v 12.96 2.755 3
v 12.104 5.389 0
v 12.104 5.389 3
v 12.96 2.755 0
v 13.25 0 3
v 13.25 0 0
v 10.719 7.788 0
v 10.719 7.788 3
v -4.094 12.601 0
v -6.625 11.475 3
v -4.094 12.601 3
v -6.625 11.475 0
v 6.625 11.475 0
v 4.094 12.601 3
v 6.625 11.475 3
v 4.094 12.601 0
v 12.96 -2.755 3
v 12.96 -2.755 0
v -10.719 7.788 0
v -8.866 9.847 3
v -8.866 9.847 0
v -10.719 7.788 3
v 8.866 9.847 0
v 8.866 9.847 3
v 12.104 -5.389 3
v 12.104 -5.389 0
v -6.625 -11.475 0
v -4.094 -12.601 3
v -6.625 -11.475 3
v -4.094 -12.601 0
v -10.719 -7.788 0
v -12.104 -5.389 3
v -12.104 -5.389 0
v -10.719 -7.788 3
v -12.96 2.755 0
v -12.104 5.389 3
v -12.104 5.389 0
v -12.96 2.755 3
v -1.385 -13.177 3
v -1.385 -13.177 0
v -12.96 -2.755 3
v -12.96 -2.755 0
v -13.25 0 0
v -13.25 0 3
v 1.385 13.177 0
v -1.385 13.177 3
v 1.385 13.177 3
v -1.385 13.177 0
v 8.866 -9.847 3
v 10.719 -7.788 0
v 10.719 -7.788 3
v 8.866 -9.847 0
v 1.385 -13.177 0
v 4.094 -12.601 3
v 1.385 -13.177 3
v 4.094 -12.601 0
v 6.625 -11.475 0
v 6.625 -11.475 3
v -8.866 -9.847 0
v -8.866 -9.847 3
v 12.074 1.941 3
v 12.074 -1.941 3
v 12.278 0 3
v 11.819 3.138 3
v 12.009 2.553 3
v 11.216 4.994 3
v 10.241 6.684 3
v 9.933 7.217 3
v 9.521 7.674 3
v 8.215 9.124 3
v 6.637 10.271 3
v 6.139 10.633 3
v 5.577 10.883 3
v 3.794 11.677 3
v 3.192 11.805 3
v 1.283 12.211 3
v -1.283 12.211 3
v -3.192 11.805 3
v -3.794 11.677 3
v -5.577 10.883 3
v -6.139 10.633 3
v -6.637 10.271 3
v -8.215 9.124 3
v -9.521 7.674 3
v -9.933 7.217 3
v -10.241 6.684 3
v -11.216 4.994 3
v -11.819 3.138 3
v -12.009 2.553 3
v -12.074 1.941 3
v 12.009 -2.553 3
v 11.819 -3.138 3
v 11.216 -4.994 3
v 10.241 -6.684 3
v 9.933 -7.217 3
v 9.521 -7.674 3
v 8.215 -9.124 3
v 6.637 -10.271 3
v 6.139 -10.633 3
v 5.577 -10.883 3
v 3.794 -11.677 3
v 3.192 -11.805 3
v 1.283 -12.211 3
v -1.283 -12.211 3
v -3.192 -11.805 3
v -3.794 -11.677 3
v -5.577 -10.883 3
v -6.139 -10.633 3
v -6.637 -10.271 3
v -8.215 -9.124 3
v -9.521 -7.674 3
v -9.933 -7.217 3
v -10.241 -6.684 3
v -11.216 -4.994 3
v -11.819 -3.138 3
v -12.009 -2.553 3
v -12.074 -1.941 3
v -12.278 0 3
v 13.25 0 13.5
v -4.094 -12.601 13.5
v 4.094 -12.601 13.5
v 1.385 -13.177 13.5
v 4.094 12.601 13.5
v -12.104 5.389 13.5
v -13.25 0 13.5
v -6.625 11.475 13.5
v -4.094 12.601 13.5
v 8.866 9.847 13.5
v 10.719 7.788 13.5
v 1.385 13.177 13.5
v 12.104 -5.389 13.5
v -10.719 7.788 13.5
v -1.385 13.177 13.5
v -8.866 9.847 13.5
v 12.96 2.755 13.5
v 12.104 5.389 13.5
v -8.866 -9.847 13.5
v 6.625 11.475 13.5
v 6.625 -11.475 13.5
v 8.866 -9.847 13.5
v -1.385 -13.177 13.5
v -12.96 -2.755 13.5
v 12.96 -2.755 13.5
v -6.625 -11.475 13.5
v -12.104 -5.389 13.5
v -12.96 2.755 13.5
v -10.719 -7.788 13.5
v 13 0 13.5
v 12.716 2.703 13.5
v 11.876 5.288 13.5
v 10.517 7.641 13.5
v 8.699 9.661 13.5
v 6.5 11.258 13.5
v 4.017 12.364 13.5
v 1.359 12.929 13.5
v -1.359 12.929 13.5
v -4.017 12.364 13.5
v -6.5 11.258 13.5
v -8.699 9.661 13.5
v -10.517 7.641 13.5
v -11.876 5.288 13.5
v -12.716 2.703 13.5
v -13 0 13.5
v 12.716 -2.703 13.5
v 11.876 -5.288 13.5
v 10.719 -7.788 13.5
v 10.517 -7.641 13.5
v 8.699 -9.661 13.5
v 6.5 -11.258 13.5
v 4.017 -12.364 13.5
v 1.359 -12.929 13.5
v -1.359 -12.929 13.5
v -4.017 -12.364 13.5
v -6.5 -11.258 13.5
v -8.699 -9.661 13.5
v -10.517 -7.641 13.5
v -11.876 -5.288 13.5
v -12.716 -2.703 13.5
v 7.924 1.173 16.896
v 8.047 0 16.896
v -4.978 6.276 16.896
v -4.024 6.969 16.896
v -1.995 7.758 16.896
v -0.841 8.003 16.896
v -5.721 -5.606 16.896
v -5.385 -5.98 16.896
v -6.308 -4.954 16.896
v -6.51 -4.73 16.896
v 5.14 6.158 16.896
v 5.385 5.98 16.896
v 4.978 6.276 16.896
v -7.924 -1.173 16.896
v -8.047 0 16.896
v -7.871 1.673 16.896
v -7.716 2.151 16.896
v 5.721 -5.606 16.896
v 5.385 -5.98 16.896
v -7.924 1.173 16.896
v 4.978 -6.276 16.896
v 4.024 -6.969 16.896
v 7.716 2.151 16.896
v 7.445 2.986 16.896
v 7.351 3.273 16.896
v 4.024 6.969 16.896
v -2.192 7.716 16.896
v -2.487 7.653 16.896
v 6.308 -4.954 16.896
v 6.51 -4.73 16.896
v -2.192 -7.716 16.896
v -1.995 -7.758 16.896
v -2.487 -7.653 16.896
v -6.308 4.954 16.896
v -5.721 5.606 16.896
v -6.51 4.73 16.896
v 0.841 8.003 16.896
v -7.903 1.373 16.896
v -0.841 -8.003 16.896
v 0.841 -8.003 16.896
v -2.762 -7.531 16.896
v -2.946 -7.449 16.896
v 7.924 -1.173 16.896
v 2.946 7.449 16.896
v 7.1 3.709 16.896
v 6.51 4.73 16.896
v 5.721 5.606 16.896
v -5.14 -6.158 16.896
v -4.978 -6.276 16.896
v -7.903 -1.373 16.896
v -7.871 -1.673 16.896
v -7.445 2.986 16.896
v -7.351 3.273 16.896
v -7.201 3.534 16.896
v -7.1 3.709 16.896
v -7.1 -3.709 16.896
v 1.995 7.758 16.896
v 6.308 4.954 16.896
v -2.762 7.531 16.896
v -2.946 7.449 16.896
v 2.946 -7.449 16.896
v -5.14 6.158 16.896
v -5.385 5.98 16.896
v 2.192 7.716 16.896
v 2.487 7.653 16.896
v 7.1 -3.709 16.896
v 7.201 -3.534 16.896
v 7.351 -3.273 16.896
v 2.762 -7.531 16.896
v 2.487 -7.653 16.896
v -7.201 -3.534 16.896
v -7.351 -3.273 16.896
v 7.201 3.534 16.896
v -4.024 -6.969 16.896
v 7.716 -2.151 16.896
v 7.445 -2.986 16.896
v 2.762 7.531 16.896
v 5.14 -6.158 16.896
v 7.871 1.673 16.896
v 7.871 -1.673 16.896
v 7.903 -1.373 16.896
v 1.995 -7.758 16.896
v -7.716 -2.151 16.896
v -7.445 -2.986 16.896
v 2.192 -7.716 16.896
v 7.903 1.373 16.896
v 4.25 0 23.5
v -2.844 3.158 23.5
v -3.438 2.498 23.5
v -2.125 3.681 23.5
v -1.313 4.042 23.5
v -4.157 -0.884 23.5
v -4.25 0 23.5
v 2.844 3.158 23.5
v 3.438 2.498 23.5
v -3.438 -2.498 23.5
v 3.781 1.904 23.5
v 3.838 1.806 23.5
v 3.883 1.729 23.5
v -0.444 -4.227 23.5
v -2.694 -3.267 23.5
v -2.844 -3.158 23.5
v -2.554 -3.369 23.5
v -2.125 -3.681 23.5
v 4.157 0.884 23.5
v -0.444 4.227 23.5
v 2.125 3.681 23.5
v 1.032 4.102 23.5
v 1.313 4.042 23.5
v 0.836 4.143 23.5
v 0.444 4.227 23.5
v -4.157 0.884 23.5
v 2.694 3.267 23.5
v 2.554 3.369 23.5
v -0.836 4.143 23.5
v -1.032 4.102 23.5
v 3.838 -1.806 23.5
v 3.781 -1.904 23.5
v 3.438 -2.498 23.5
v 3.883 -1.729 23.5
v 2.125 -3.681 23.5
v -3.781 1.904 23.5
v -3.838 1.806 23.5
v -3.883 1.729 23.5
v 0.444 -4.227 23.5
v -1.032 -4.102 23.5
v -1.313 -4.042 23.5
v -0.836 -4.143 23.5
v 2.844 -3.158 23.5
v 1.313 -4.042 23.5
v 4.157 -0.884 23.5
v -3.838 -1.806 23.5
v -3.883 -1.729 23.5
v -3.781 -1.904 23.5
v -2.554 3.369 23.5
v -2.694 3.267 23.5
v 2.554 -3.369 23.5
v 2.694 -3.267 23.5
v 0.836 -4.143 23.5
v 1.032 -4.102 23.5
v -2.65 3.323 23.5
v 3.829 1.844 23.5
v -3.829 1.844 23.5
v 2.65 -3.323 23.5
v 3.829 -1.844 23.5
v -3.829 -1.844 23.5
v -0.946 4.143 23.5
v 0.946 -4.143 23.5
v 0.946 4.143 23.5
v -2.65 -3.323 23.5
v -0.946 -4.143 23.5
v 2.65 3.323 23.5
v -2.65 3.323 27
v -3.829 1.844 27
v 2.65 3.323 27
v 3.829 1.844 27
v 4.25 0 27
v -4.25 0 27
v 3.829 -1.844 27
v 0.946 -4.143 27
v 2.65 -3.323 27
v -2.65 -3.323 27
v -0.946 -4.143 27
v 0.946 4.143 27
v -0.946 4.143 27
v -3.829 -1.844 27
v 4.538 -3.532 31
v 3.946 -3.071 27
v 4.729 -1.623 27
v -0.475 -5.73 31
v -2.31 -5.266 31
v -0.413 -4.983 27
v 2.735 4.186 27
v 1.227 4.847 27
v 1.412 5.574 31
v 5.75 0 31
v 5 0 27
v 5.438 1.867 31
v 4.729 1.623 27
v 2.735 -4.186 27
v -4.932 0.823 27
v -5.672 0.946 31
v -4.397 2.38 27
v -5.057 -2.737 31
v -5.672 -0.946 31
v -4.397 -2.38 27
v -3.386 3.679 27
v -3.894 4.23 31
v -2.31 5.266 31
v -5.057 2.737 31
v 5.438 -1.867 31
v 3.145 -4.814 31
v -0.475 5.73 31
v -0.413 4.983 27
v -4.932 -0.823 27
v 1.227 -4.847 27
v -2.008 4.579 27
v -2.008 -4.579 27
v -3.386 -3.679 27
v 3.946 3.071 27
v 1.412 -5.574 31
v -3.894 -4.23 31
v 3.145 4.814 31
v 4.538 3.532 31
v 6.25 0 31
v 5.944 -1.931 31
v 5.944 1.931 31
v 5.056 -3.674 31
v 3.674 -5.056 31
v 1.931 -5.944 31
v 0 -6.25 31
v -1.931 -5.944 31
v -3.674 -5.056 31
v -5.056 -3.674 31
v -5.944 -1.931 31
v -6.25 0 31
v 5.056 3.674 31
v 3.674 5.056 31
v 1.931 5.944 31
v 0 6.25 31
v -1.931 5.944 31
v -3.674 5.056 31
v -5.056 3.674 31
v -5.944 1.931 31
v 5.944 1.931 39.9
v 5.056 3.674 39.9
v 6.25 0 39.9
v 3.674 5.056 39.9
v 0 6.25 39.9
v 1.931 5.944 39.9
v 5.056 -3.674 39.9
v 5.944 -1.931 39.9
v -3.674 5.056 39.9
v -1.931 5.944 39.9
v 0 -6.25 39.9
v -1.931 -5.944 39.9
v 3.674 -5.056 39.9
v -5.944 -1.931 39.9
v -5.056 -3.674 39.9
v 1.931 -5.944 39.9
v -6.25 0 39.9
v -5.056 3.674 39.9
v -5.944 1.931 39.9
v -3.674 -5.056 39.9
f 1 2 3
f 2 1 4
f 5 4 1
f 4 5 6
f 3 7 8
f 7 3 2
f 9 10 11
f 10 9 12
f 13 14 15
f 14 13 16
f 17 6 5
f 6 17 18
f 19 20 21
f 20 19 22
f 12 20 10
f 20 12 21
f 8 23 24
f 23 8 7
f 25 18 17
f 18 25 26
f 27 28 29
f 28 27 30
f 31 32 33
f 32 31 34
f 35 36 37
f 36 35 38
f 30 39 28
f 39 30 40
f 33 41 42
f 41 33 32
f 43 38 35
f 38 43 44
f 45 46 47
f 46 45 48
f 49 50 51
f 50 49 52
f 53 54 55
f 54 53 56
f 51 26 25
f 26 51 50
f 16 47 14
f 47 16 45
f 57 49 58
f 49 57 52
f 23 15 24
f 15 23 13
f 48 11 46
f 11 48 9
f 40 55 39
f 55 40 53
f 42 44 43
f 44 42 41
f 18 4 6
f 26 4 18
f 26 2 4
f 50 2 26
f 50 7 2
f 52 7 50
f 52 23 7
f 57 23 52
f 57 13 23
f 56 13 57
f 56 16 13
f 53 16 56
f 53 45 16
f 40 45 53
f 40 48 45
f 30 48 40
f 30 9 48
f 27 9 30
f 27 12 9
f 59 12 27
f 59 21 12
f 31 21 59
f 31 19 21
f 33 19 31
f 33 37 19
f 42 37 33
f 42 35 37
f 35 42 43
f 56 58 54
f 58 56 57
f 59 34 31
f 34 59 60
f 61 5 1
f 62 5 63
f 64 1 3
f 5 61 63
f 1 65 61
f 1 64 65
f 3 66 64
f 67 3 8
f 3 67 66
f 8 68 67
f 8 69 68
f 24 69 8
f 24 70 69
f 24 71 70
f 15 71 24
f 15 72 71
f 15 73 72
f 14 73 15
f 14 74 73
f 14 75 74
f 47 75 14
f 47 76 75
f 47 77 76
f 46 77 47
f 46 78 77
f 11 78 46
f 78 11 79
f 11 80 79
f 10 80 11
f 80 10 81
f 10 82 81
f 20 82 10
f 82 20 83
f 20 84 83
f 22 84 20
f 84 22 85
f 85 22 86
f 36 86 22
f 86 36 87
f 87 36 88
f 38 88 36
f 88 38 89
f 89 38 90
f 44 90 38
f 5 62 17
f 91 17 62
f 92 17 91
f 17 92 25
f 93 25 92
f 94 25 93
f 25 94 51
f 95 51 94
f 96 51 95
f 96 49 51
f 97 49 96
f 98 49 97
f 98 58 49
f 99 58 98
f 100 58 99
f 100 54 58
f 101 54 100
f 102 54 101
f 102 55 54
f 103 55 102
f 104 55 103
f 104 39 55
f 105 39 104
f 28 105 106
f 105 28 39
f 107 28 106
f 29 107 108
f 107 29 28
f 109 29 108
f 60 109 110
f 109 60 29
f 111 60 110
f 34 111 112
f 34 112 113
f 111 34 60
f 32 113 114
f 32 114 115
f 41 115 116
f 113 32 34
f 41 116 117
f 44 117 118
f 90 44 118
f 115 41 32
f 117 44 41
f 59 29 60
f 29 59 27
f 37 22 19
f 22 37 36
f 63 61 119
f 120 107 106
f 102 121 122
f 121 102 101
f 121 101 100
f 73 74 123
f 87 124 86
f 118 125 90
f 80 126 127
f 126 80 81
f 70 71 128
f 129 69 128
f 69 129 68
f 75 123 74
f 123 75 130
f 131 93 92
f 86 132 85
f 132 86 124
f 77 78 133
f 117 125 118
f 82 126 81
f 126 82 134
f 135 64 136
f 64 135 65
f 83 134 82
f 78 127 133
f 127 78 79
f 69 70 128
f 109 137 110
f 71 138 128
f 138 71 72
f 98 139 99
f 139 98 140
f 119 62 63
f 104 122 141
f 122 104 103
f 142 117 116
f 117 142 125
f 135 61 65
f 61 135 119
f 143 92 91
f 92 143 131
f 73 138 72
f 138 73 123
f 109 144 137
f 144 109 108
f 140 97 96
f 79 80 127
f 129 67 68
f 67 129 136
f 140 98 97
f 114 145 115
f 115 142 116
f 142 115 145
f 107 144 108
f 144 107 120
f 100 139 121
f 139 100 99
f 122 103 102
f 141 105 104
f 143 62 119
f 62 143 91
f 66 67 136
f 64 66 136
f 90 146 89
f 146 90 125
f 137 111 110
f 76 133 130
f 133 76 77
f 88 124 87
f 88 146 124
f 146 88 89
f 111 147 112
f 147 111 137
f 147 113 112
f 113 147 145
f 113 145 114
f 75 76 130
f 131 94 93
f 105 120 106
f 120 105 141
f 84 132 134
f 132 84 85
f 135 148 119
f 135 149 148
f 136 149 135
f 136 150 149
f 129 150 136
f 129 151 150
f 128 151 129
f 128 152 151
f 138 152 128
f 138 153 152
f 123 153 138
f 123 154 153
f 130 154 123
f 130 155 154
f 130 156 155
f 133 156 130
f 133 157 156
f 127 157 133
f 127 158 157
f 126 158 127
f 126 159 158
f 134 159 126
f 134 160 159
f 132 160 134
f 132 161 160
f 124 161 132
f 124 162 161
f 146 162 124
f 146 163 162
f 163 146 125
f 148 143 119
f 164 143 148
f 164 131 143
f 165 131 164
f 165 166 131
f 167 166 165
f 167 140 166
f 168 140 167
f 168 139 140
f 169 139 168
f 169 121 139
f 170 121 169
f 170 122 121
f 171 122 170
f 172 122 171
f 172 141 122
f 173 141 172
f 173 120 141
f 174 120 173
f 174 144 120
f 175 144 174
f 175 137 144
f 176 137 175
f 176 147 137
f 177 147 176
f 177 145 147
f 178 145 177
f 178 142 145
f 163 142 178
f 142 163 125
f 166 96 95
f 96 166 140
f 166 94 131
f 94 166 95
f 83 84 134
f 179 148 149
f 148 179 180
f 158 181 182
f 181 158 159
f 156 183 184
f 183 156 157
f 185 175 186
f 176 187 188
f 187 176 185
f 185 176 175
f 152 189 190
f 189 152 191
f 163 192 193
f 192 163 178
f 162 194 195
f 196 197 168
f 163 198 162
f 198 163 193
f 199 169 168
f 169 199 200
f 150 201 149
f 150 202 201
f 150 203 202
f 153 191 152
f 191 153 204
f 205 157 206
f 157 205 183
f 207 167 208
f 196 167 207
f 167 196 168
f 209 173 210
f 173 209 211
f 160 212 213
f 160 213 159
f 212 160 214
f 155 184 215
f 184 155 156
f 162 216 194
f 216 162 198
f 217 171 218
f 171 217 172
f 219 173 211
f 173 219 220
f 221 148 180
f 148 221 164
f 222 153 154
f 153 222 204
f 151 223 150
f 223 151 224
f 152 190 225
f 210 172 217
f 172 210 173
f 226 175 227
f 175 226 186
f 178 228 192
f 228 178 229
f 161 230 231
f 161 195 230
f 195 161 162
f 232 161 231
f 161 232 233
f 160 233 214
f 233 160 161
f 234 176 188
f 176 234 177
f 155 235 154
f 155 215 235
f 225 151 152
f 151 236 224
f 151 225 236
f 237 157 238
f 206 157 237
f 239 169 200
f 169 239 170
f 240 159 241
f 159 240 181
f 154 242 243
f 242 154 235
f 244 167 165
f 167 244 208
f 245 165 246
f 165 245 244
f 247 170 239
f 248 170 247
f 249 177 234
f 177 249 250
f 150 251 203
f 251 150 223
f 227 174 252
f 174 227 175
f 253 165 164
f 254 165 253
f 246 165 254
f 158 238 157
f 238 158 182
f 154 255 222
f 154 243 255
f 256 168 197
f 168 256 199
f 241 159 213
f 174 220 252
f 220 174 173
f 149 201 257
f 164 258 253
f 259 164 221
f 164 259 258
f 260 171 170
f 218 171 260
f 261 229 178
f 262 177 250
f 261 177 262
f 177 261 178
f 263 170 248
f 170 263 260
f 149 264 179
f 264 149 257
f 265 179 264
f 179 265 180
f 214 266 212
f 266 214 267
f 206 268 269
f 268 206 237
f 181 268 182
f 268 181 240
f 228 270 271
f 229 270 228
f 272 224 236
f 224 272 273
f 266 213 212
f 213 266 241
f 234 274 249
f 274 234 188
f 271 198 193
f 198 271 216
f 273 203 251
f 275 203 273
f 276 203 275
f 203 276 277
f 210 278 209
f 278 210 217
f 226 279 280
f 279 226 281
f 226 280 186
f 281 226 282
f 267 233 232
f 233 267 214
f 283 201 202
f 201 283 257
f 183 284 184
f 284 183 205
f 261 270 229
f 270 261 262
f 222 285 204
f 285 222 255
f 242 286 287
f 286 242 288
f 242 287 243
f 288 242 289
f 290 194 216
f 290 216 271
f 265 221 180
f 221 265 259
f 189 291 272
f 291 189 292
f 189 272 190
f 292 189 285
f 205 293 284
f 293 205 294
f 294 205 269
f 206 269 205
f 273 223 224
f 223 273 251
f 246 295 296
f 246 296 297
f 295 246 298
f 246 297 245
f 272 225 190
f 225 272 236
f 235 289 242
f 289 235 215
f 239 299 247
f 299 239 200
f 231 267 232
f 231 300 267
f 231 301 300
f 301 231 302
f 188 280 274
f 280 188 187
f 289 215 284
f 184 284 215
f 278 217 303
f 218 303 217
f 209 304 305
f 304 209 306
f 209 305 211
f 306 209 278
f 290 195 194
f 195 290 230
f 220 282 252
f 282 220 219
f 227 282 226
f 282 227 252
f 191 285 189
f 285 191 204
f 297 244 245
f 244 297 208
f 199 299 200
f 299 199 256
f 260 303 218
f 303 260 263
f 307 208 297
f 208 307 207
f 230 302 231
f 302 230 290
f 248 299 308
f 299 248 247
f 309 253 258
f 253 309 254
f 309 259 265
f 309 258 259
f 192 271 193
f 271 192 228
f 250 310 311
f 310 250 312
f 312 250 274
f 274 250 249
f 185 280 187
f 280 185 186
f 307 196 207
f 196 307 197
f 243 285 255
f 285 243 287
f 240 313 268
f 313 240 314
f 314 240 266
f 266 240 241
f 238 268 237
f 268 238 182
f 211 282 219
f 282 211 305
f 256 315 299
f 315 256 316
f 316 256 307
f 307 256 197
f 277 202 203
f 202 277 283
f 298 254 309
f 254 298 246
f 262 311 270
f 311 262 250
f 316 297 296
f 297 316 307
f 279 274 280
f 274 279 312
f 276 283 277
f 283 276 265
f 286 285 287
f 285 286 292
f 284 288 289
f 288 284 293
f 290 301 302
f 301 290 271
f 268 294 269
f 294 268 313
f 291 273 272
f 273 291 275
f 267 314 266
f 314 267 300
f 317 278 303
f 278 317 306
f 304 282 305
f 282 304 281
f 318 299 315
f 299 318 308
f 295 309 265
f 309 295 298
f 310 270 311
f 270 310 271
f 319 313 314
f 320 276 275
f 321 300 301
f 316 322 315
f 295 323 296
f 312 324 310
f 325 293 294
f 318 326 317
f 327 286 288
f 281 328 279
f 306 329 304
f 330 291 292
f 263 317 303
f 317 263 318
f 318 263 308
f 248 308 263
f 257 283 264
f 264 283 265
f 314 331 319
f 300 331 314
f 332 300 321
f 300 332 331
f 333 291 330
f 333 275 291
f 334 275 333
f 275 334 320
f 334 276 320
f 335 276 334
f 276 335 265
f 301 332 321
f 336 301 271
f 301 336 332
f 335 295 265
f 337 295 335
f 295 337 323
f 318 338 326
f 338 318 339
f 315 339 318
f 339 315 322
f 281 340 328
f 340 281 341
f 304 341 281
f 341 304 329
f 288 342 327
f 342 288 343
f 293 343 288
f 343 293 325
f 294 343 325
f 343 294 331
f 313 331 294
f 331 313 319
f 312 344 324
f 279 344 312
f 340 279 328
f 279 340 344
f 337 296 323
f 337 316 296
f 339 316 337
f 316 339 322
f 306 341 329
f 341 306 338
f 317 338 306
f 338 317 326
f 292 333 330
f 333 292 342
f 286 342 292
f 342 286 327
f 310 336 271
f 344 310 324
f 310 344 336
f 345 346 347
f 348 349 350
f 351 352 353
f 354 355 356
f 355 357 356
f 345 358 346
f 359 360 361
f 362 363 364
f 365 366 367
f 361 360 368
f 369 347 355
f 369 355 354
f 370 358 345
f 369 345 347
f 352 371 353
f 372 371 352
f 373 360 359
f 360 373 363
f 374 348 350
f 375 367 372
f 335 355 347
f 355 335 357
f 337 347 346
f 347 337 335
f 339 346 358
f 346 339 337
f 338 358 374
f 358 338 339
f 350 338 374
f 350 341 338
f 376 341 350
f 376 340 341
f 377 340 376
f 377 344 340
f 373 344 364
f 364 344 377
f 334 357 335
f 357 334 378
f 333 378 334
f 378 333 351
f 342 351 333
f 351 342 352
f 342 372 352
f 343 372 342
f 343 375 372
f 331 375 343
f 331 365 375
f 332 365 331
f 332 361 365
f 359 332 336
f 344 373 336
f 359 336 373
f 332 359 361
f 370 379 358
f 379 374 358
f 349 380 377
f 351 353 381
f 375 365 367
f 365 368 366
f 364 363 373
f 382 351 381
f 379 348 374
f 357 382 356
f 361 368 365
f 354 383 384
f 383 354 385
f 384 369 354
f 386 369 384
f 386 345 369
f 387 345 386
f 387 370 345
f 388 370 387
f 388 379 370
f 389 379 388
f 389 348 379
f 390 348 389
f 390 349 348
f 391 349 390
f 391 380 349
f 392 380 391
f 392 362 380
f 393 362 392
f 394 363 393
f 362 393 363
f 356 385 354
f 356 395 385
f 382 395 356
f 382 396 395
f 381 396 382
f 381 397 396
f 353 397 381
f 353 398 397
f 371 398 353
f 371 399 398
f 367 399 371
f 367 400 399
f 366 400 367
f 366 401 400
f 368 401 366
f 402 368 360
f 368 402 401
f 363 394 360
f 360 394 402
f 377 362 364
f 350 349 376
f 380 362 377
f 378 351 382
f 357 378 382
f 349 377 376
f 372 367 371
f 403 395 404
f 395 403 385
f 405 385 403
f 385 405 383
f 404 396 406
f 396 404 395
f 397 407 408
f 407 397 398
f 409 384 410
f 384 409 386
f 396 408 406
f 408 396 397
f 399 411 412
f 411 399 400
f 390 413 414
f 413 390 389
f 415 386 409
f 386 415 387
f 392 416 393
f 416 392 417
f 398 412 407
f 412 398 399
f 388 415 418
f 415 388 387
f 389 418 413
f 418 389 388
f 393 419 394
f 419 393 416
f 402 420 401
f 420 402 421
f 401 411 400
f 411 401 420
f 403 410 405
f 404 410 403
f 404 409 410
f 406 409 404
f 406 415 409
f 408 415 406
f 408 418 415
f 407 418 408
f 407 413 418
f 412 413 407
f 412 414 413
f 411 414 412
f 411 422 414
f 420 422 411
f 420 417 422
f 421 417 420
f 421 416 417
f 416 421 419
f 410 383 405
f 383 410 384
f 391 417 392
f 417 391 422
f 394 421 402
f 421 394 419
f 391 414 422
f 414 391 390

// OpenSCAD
// base
cylinder(d=26.5, h=3);
cylinder(d1=24, d2=26.5, h=13.5);

// tapered neck on base
translate([0,0,13.5]) cylinder(d1=26, d2= 8.5, h=6);
translate([0,0,13.5]) cylinder(d1=20, d2= 8.5, h=10);
//translate([0,0,13.5]) cylinder(d1=14, d2= 8.5, h=16);

//main body
translate([0,0, 23.5]) cylinder(d=8.5, h=13);

translate([0,0,27])
cylinder(d1=10, d2=11.5, h=4);
//top of rook
translate([0,0,31]) cylinder(d=12.5, h=8.9);
